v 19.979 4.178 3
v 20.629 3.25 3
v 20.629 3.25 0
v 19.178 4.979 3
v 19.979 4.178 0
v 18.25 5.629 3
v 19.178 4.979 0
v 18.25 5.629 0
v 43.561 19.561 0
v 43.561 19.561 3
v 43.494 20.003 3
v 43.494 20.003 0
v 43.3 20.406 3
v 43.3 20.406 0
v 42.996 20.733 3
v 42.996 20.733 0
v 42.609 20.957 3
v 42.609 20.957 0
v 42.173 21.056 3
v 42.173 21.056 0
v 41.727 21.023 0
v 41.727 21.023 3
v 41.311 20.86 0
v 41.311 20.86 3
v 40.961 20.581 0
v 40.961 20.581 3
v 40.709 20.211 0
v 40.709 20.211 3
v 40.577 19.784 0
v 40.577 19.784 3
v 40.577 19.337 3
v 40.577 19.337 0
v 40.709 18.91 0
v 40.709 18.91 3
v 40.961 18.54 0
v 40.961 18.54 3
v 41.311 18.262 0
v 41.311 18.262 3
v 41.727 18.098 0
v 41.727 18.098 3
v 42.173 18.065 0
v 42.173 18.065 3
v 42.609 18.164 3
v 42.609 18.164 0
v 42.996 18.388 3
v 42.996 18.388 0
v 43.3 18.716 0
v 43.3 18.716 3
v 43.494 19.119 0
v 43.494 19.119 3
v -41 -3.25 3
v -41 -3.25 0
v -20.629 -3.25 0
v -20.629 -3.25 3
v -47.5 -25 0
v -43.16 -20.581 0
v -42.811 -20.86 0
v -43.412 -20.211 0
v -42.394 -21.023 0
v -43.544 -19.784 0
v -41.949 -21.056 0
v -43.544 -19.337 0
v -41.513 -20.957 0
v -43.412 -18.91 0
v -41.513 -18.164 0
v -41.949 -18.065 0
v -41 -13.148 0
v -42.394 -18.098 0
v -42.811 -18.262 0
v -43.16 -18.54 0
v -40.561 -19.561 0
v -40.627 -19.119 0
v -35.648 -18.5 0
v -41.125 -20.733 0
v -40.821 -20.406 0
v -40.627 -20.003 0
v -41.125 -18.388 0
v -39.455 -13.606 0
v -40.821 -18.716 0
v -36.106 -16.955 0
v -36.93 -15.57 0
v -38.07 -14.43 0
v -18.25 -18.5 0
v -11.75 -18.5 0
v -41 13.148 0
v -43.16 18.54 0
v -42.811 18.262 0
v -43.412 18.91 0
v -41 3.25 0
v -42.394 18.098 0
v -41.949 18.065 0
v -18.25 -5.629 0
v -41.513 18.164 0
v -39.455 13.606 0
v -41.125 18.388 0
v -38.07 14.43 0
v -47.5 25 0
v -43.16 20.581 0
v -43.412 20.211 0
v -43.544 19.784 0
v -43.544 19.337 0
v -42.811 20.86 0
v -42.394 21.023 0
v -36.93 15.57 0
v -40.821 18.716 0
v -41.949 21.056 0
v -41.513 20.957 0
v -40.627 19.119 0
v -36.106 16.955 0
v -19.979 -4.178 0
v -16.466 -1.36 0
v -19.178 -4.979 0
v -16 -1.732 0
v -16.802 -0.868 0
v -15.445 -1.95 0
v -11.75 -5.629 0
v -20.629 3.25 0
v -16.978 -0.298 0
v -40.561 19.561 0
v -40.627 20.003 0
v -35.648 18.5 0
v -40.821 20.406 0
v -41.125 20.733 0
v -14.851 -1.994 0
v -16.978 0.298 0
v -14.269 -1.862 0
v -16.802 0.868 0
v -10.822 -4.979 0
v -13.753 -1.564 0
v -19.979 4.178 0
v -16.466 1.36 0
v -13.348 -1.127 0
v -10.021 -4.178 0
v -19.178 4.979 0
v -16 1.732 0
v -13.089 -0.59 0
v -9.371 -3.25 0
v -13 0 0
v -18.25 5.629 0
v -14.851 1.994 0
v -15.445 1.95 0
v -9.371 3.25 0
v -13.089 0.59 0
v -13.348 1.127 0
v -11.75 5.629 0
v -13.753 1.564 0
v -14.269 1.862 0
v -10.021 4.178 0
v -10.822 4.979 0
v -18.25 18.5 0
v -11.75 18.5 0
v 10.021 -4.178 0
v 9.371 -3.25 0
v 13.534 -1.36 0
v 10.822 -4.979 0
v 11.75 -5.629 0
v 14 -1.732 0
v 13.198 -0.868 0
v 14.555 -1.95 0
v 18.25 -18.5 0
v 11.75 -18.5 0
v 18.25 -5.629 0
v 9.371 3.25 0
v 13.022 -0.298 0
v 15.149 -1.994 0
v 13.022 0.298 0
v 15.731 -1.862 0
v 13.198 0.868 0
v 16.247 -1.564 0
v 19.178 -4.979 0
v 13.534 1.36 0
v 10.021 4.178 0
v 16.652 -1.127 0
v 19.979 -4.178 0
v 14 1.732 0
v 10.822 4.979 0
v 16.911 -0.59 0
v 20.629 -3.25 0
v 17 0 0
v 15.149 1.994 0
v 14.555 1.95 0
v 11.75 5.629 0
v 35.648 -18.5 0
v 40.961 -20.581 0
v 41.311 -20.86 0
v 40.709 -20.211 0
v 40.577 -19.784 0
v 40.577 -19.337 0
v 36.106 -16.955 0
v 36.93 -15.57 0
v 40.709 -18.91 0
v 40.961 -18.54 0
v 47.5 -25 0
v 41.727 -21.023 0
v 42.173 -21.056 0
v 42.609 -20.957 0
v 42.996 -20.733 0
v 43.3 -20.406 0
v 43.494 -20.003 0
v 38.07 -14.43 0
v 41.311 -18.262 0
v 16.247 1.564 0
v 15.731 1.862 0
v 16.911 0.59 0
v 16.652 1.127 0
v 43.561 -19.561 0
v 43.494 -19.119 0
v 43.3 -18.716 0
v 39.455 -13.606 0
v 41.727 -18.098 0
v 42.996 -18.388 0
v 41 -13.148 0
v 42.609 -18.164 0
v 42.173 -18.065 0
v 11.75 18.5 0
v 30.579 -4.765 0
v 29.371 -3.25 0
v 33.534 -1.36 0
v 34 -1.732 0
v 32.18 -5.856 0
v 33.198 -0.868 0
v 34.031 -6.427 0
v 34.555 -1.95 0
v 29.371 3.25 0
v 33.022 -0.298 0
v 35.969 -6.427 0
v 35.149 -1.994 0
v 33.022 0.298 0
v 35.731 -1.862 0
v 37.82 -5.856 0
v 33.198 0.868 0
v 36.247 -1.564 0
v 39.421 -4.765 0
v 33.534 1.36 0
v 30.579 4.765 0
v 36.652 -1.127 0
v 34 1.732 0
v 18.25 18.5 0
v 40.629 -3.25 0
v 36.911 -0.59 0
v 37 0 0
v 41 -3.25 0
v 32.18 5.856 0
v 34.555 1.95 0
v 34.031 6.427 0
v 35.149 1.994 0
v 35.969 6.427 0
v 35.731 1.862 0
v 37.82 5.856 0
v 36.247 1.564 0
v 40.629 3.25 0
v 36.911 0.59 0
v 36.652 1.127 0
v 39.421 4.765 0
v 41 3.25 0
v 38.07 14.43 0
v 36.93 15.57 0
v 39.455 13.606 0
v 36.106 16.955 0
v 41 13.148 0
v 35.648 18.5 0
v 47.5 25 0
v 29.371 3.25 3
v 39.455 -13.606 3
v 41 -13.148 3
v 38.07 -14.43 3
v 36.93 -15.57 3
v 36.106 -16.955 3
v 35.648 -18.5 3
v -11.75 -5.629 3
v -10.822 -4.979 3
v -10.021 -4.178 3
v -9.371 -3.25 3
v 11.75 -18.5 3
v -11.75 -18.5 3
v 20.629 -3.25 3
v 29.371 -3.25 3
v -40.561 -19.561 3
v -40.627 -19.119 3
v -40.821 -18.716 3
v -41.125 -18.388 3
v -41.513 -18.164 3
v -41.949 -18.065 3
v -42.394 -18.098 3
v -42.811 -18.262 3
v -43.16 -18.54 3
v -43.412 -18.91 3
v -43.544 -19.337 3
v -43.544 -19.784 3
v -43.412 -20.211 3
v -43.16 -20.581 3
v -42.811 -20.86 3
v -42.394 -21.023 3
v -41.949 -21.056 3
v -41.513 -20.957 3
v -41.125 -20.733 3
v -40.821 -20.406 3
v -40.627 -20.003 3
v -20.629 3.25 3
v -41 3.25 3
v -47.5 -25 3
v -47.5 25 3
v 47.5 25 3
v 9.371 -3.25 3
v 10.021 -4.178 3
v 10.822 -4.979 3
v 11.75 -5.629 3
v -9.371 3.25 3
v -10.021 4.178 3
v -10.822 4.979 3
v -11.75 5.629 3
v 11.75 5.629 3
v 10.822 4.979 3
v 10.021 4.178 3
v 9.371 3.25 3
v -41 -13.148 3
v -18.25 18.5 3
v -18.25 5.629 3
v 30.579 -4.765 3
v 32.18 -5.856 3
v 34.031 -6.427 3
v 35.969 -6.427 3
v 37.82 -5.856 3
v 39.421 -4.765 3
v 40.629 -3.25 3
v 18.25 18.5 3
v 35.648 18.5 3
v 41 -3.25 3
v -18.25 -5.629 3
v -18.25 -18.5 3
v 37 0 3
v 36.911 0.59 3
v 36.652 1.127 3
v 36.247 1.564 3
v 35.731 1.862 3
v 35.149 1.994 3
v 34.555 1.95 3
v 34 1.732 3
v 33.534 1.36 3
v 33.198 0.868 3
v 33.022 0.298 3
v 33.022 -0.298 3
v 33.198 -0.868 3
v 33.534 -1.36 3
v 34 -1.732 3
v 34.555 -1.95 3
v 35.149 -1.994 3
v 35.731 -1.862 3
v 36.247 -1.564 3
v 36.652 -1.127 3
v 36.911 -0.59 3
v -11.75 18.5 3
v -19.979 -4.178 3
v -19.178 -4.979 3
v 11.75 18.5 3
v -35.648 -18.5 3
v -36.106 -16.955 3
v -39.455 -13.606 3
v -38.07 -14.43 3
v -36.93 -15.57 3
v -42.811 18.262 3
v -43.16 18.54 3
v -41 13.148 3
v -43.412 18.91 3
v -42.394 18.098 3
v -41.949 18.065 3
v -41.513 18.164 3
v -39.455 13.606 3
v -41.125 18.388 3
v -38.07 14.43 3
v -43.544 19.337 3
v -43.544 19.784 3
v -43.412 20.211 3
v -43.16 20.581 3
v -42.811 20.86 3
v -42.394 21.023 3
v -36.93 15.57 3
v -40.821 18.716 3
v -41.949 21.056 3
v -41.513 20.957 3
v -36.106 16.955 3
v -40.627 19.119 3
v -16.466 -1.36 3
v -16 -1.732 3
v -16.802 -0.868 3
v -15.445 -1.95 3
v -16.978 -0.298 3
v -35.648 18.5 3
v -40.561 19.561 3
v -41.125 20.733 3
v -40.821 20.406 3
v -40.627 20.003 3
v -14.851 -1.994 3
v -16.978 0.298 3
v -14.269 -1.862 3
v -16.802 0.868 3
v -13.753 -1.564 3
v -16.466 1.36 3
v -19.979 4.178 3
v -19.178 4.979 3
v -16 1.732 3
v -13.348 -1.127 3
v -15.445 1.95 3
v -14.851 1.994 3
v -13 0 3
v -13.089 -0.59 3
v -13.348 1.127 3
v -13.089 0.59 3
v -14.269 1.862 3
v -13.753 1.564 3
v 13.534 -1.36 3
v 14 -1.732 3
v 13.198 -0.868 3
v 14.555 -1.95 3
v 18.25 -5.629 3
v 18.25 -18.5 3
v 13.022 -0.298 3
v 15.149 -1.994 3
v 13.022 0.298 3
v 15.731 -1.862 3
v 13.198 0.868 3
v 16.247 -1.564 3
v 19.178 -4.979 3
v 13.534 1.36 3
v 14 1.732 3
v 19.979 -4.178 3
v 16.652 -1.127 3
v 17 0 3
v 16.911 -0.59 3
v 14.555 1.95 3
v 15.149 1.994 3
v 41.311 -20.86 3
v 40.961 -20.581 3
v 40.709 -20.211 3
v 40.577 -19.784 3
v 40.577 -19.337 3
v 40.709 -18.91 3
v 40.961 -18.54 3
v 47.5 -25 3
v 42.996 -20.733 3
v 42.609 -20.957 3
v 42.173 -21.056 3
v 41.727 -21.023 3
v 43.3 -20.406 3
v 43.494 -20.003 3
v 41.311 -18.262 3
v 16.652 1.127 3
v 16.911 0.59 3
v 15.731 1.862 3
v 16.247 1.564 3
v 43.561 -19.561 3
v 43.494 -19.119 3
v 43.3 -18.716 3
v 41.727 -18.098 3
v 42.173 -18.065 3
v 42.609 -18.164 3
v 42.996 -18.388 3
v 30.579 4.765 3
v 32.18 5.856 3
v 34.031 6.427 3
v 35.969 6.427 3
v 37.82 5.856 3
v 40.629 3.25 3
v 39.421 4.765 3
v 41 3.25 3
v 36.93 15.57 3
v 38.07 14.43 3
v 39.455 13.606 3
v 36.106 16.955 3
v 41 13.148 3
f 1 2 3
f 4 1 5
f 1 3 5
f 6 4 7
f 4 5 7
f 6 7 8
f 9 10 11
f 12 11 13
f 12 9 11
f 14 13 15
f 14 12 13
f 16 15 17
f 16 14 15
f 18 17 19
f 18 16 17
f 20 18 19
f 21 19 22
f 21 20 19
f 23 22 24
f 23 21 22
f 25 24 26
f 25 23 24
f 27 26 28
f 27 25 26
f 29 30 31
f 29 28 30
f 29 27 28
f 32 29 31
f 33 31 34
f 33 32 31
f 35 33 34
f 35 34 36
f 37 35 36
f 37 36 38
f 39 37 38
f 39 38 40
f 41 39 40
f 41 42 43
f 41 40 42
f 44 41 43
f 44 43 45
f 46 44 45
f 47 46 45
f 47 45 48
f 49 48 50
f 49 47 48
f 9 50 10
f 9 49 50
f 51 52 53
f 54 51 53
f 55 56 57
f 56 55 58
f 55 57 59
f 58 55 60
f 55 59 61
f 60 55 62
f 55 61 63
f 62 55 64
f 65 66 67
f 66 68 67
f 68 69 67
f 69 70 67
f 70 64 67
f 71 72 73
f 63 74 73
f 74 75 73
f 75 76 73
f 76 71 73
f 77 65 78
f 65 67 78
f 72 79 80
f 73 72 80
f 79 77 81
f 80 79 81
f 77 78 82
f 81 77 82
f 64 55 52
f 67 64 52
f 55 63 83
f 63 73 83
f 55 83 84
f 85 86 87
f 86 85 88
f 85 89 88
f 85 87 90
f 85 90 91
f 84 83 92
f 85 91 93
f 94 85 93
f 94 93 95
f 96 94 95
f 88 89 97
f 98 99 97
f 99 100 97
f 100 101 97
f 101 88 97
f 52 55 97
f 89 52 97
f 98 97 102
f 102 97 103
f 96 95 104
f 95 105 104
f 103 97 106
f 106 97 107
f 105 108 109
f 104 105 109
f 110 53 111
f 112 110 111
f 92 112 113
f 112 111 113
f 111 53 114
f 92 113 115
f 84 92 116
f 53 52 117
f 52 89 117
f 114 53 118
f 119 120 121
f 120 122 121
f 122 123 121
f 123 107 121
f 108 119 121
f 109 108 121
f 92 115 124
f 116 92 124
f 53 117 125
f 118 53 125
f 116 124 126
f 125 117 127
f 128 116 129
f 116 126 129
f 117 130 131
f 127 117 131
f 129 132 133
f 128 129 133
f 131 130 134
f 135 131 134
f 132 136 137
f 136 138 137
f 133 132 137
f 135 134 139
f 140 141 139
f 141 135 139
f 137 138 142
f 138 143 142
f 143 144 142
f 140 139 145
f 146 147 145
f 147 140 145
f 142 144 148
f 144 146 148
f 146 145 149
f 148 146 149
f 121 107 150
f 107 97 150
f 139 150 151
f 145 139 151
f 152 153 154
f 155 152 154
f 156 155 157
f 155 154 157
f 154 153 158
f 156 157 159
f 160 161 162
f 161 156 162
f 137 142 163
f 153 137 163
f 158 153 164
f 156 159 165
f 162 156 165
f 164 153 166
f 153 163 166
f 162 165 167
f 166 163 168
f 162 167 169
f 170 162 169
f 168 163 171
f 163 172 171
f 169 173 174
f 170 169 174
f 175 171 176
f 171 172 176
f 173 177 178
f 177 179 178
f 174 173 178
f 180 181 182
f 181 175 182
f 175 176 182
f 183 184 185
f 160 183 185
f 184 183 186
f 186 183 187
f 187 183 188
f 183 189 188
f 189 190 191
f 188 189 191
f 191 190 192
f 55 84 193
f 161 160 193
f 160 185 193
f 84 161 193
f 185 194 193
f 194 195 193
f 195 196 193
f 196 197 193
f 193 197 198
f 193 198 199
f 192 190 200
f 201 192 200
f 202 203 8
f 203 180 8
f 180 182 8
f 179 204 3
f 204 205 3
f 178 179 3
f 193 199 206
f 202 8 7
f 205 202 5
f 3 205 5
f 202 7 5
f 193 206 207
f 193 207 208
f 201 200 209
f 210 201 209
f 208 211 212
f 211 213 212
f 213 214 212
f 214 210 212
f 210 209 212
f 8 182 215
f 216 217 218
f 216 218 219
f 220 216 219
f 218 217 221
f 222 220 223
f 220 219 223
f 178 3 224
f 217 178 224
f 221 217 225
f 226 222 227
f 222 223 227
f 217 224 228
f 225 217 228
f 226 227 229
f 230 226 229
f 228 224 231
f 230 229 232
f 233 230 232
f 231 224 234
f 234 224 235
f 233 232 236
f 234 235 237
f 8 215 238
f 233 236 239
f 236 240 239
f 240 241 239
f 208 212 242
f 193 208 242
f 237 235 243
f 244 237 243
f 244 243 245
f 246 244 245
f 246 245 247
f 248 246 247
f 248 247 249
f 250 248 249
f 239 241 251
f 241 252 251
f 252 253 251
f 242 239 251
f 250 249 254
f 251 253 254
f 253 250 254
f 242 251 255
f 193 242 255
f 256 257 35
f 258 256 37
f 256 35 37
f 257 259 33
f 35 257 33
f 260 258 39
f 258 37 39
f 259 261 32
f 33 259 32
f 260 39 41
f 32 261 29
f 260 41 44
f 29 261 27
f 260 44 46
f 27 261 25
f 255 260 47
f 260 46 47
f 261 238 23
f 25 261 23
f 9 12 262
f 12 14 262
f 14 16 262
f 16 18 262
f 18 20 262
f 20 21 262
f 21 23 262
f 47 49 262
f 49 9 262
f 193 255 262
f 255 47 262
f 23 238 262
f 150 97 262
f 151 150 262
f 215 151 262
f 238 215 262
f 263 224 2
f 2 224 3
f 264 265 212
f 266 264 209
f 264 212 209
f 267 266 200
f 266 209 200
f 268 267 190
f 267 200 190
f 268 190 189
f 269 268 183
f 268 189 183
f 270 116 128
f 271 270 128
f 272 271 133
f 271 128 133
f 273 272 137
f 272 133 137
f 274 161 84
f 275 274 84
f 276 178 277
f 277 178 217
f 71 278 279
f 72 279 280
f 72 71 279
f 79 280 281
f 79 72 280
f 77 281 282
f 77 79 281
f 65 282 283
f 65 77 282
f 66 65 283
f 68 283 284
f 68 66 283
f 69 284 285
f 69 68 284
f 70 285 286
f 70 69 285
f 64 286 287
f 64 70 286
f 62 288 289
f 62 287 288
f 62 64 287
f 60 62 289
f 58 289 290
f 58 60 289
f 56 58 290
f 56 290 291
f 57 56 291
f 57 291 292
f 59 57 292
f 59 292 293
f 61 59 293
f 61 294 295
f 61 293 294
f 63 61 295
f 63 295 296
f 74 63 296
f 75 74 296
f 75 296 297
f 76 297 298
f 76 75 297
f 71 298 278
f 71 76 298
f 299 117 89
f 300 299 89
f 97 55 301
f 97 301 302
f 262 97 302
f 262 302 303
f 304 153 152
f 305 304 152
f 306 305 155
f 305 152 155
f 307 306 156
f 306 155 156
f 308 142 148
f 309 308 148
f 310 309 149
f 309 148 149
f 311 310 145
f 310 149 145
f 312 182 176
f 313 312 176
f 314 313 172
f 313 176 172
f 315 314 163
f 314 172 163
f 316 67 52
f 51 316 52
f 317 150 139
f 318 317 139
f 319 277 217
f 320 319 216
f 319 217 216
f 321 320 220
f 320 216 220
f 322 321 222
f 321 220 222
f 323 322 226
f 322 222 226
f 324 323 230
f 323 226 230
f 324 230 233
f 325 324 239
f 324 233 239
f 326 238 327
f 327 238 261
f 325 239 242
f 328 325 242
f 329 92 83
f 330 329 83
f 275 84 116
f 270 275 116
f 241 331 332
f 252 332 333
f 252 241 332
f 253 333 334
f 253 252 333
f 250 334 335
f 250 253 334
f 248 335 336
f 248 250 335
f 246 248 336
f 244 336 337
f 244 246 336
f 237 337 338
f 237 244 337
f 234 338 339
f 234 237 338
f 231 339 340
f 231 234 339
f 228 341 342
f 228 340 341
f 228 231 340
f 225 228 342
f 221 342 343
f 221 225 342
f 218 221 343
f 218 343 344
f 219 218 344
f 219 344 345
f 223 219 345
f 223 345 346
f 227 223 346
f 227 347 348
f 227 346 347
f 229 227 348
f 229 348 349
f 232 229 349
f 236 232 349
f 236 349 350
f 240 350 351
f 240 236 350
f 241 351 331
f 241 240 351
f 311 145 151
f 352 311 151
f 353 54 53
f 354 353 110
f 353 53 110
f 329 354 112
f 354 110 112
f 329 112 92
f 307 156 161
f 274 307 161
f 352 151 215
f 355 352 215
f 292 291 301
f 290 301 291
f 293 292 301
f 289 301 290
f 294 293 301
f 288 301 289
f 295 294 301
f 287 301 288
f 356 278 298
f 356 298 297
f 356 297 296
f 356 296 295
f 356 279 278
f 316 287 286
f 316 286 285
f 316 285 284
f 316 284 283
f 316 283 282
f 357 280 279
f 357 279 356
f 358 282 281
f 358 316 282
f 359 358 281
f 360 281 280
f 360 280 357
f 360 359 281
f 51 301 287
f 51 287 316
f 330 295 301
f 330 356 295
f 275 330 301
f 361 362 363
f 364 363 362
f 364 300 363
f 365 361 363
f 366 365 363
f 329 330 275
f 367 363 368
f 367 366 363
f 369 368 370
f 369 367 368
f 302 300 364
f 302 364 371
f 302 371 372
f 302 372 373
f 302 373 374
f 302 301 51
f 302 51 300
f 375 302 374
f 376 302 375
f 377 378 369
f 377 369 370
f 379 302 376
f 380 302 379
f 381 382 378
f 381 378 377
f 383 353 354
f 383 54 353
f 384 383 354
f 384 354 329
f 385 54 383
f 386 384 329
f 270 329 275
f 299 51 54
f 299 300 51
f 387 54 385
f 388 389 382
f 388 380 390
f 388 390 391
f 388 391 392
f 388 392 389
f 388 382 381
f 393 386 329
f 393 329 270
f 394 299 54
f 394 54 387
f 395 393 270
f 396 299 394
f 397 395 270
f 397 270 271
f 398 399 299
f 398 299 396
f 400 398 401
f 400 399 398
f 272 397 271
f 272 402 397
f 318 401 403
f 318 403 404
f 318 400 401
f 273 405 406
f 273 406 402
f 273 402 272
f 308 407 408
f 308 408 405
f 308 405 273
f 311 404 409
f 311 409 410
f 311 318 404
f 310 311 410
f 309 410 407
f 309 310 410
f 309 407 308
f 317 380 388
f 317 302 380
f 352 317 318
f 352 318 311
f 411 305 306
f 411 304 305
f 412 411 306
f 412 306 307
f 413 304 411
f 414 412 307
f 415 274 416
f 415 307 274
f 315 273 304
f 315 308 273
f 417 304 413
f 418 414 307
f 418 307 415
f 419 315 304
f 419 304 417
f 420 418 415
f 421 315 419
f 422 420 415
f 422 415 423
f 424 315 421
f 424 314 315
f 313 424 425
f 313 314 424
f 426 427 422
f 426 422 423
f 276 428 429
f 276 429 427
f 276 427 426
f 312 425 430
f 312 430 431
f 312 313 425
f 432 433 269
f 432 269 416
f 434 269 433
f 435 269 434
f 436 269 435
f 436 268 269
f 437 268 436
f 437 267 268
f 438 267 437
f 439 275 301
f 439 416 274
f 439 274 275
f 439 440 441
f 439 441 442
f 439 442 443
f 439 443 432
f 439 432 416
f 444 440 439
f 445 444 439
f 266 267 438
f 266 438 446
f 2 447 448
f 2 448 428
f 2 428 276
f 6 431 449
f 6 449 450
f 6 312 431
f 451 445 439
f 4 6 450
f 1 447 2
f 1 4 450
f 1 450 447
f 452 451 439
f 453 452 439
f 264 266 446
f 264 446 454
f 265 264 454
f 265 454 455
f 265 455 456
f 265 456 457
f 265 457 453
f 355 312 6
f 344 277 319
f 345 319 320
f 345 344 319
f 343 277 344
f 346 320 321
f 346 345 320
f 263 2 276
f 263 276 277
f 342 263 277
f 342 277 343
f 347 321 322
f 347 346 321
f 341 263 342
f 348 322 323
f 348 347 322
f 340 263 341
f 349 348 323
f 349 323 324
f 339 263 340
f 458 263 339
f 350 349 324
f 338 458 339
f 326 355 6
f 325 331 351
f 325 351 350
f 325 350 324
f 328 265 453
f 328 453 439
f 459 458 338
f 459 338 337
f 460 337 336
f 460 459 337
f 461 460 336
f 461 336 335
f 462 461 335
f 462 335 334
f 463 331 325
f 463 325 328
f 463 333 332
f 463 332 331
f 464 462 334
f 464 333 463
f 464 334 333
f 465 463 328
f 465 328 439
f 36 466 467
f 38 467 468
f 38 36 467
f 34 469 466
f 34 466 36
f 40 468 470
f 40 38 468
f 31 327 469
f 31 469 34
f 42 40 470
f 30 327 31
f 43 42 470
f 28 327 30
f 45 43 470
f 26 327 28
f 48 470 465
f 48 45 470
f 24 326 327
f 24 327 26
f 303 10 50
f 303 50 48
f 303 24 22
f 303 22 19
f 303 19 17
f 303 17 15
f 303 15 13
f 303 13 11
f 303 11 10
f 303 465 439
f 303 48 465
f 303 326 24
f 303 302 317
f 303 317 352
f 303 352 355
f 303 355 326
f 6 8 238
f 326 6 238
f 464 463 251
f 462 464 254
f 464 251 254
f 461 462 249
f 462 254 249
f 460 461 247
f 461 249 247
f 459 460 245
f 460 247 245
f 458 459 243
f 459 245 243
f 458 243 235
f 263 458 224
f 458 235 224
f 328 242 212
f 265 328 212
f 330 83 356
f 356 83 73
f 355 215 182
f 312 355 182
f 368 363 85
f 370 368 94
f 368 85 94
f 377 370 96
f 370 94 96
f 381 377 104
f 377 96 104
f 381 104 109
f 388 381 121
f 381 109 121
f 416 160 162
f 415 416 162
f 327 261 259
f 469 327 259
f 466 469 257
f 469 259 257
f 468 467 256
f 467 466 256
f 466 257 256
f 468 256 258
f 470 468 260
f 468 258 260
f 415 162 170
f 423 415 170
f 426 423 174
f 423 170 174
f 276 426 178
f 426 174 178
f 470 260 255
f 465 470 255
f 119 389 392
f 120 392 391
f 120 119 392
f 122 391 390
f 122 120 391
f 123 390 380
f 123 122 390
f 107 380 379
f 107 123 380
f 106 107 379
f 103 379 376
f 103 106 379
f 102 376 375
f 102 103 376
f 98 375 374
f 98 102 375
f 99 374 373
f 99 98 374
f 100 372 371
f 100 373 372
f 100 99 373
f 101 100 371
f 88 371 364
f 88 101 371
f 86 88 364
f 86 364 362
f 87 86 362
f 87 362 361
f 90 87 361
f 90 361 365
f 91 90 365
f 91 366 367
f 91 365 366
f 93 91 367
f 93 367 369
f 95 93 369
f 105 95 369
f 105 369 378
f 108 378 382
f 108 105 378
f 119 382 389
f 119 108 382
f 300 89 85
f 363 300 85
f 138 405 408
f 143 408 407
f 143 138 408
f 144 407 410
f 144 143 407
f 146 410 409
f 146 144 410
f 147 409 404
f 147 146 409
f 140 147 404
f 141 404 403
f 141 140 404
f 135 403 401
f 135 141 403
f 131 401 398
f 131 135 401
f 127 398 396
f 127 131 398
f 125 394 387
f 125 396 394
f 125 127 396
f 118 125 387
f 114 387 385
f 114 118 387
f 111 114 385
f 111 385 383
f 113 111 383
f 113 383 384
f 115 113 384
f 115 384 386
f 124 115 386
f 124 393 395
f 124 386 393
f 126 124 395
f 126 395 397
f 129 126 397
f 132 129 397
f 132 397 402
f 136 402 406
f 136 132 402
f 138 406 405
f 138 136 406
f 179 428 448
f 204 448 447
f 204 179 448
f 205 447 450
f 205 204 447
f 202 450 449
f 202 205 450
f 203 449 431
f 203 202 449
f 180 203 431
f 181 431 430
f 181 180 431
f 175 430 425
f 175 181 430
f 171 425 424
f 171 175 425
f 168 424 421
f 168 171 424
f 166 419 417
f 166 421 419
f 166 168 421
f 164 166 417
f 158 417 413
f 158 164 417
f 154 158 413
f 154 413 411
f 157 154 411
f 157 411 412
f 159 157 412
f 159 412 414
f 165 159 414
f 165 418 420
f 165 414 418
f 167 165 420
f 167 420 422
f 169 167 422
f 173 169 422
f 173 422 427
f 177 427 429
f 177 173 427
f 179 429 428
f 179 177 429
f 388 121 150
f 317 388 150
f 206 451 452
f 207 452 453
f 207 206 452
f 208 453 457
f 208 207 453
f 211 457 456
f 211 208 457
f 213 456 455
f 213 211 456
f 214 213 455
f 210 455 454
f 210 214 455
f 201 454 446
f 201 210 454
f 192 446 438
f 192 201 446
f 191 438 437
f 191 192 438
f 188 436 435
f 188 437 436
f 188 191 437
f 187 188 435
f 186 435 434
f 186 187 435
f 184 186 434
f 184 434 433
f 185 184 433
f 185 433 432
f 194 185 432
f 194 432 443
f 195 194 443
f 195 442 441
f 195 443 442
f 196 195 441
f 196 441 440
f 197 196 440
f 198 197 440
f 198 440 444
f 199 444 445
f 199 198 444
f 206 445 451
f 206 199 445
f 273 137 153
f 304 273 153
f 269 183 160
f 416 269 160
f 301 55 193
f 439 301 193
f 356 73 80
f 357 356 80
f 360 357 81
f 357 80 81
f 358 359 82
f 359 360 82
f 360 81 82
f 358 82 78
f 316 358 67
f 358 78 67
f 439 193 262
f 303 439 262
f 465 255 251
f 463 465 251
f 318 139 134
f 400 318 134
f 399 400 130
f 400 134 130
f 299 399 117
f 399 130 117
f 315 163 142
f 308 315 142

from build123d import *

# Parameters (mm, degrees)
SKETCH2_W               = 95
SKETCH2_H               = 50
BOSS_EXTRUDE1_DEPTH     = 3
SKETCH1_R               = 2
SKETCH1_R_2             = 1.5
CUT_EXTRUDE2_DEPTH      = 4
CUT_EXTRUDE2_DEPTH_BACK = 1


with BuildPart() as part:
    # Sketch2 → Boss-Extrude1 (new body)
    with BuildSketch(Plane.XY):
        Rectangle(SKETCH2_W, SKETCH2_H)
    extrude(amount=BOSS_EXTRUDE1_DEPTH)

    # Sketch1 → Cut-Extrude2 (cut, two sides)
    with BuildSketch(Plane.XY) as cut_extrude2_sk:
        with BuildLine():
            ThreePointArc((18.25, -5.629165125), (19.596194078, -4.596194078), (20.629165125, -3.25))
            Line((20.629165125, -3.25), (29.370834875, -3.25))
            ThreePointArc((29.370834875, -3.25), (35, -6.5), (40.629165125, -3.25))
            Line((40.629165125, -3.25), (41, -3.25))
            Line((41, -3.25), (41, -13.147782503))
            ThreePointArc((41, -13.147782503), (37.464466094, -14.964466094), (35.647782503, -18.5))
            Line((35.647782503, -18.5), (18.25, -18.5))
            Line((18.25, -18.5), (18.25, -5.629165125))
        make_face()
        with BuildLine():
            ThreePointArc((40.629165125, 3.25), (35, 6.5), (29.370834875, 3.25))
            Line((29.370834875, 3.25), (20.629165125, 3.25))
            ThreePointArc((20.629165125, 3.25), (19.596194078, 4.596194078), (18.25, 5.629165125))
            Line((18.25, 5.629165125), (18.25, 18.5))
            Line((18.25, 18.5), (35.647782503, 18.5))
            ThreePointArc((35.647782503, 18.5), (37.464466094, 14.964466094), (41, 13.147782503))
            Line((41, 13.147782503), (41, 3.25))
            Line((41, 3.25), (40.629165125, 3.25))
        make_face()
        with BuildLine():
            ThreePointArc((11.75, 5.629165125), (10.403805922, 4.596194078), (9.370834875, 3.25))
            Line((9.370834875, 3.25), (-9.370834875, 3.25))
            ThreePointArc((-9.370834875, 3.25), (-10.403805922, 4.596194078), (-11.75, 5.629165125))
            Line((-11.75, 5.629165125), (-11.75, 18.5))
            Line((-11.75, 18.5), (11.75, 18.5))
            Line((11.75, 18.5), (11.75, 5.629165125))
        make_face()
        with BuildLine():
            ThreePointArc((-11.75, -5.629165125), (-10.403805922, -4.596194078), (-9.370834875, -3.25))
            Line((-9.370834875, -3.25), (9.370834875, -3.25))
            ThreePointArc((9.370834875, -3.25), (10.403805922, -4.596194078), (11.75, -5.629165125))
            Line((11.75, -5.629165125), (11.75, -18.5))
            Line((11.75, -18.5), (-11.75, -18.5))
            Line((-11.75, -18.5), (-11.75, -5.629165125))
        make_face()
        with Locations((-15, 0)):
            Circle(SKETCH1_R)
        with BuildLine():
            ThreePointArc((-18.25, 5.629165125), (-19.596194078, 4.596194078), (-20.629165125, 3.25))
            Line((-20.629165125, 3.25), (-41, 3.25))
            Line((-41, 3.25), (-41, 13.147782503))
            ThreePointArc((-41, 13.147782503), (-37.464466094, 14.964466094), (-35.647782503, 18.5))
            Line((-35.647782503, 18.5), (-18.25, 18.5))
            Line((-18.25, 18.5), (-18.25, 5.629165125))
        make_face()
        with BuildLine():
            ThreePointArc((-20.629165125, -3.25), (-19.596194078, -4.596194078), (-18.25, -5.629165125))
            Line((-18.25, -5.629165125), (-18.25, -18.5))
            Line((-18.25, -18.5), (-35.647782503, -18.5))
            ThreePointArc((-35.647782503, -18.5), (-37.464466094, -14.964466094), (-41, -13.147782503))
            Line((-41, -13.147782503), (-41, -3.25))
            Line((-41, -3.25), (-20.629165125, -3.25))
        make_face()
        with Locations((42.060660172, -19.560660172)):
            Circle(SKETCH1_R_2)
        with Locations((42.060660172, 19.560660172)):
            Circle(SKETCH1_R_2)
        with Locations((15, 0)):
            Circle(SKETCH1_R)
        with Locations((35, 0)):
            Circle(SKETCH1_R)
        with Locations((-42.060660172, 19.560660172)):
            Circle(SKETCH1_R_2)
        with Locations((-42.060660172, -19.560660172)):
            Circle(SKETCH1_R_2)
    extrude(amount=CUT_EXTRUDE2_DEPTH, mode=Mode.SUBTRACT)
    extrude(cut_extrude2_sk.sketch, amount=-CUT_EXTRUDE2_DEPTH_BACK, mode=Mode.SUBTRACT)


solid = part.part
